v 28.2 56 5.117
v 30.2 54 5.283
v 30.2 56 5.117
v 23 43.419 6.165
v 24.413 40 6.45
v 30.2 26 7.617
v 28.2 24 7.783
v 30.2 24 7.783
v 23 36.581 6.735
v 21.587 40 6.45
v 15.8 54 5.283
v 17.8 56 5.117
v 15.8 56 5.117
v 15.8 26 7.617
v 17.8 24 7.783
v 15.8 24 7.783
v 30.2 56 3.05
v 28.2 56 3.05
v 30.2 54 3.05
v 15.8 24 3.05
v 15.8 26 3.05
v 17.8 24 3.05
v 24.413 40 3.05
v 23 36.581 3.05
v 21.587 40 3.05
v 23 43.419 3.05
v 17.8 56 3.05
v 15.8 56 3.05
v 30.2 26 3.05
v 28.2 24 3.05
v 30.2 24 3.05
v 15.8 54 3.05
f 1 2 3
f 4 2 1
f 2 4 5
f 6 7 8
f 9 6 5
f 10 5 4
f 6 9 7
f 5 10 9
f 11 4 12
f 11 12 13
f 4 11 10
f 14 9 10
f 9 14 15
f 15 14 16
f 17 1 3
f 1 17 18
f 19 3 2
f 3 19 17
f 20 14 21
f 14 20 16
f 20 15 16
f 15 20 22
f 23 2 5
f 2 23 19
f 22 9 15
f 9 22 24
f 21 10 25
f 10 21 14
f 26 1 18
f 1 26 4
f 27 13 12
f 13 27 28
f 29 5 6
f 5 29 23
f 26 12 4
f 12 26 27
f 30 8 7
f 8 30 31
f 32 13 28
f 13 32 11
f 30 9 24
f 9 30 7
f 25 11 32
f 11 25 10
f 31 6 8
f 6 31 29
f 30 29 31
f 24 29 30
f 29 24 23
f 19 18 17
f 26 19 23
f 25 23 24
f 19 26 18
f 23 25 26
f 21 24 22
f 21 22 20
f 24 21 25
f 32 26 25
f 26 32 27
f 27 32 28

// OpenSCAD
// Lance Kindle - an adapter between two plastic train tracks.
// a wider, taller, brown track & a shorter, slimmer blue one.
// tracks are in same position, luckily.
// tracks traced out from picture in inkscape in vector form
// tested sizing by laser cutting. Then had to convert to dxf
/* 
https://reprap.org/forum/read.php?313,627739,714349#msg-714349
1 - Draw object in Inkscape
2 - Move object to lower left corner of page, align left/right center marker to left page border, align top/bottom center marker with the bottom page border (it may help to turn off the page shadow in Document Properties)
2* - this can be done with shrinking document size to selected object
3 - Select Objects you want to export
4 - Convert to Path: Path --> Object to Path (Ctrl+Shift+C)
5 - Flatten Beziers: Extensions --> Modify Path --> Flatten Beziers (adjust the value based on granularity you need; I use 0.1 for most things)
6 - Save as Desktop Cutting Plotter (Autocad DXF R14) .DXF file
7 - Make sure the ROBO-Master spline option is unchecked, LWPOLYLINE option is checked. I keep the base units in mm to be consistent with OpenSCAD.
7* - BASE UNITS ARE IMPORTANT! Find an option that allows you to specify mm in the Save-as-dxf dialog
*/

h2 = 11.4;  // height of larger brown train track
w2 = 45.83;  // width of brown track
W = 46; // largest width
h1 = 7.9;  // height of blue train track
H = 17;  // maximum height
L = 73;  // length of overall track
s1 = 61;  // step-out from blue track before going up
s2 = 19;  // step-out from brown track before going down
dxf_tracks_file = "joined_train_tracks.dxf";

module main_track_block() {
linear_extrude(height = H, center = false)
    import(file = dxf_tracks_file);
}

// a rough-cut slope to subtract from the main track block
module block_slope() {
polyhedron(
    points=[
     [0,s2,h2],[w2,s2,h2],[w2,s1,h1],[0,s1,h1],// bottom layer
     [0,s2,H+1],[w2,s2,H+1],[w2,s1,H+1],[0,s1,H+1], // top layer
    ], // bottom slope face
    faces=[
     [0,1,2,3],  // bottom 
     [4,5,1,0],  // front
     [7,6,5,4],  // top
     [5,6,2,1],  // right
     [6,7,3,2],  // back
     [7,4,0,3],  // left
    ]
); // sloped part of polyhedron
// now we need to create two two flat cubes that take up the
// non-sloped areas
translate([0,0,h2])
    cube(size=[W,s2,H-h2+1]);
translate([0,s1,h1])
    cube(size=[W,L-s1,H-h1+1]);
}

tw=8.3;  // track width
//16.66 -- between tracks
//18.6- 1.65 -- 16.95
between_tracks = 18.4+tw;  // width between tracks
rail_height = 3.2; // measured as 3.2 on both blue/brown
tw1_start = 5.5; // track starts from side
tw1_end = tw1_start+tw;
tw2_start = tw1_start + between_tracks; // track 2 start width
tw2_end = tw2_start + tw;
th2 = 8.2; // h2 - rail_height; measured. Track height of brown side
th1= 4.9; // > as measured. h1 - rail_height; track height of blue side
// a rough-cut track w/ slope to cut from main track block
// (after block_slope has been cut away)
module track_slope() {
    //brown track intro
    translate([tw1_start,0,th2])
        cube(size=[tw,s2,rail_height+1]);
    translate([tw2_start,0,th2])
        cube(size=[tw,s2,rail_height+1]);
    // blue track intro
    translate([tw1_start,s1,th1])
        cube(size=[tw,L-s1,rail_height+1]);
    translate([tw2_start,s1,th1])
        cube(size=[tw,L-s1,rail_height+1]);
    // 2 sloped trapezoids from one track height to the next
    // left track
   polyhedron(
    points=[
     [tw1_start,s2,th2],[tw1_end,s2,th2],[tw1_end,s1,th1],[tw1_start,s1,th1],// bottom layer
     [tw1_start,s2,h2+1],[tw1_end,s2,h2+1],[tw1_end,s1,h1+1],[tw1_start,s1,h1+1], // top layer
    ], // bottom slope face
    faces=[
     [0,1,2,3],  // bottom 
     [4,5,1,0],  // front
     [7,6,5,4],  // top
     [5,6,2,1],  // right
     [6,7,3,2],  // back
     [7,4,0,3],  // left
    ]
   );
   // right track
   polyhedron(
    points=[
     [tw2_start,s2,th2],[tw2_end,s2,th2],[tw2_end,s1,th1],[tw2_start,s1,th1],// bottom layer
     [tw2_start,s2,h2+1],[tw2_end,s2,h2+1],[tw2_end,s1,h1+1],[tw2_start,s1,h1+1], // top layer
    ], // bottom slope face
    faces=[
     [0,1,2,3],  // bottom 
     [4,5,1,0],  // front
     [7,6,5,4],  // top
     [5,6,2,1],  // right
     [6,7,3,2],  // back
     [7,4,0,3],  // left
    ]
   );
}

// make small cuts into track to provide traction
module traction_strips() {
    slat_angle = -90*(th2 - th1)/(s1 - s2);
    slat_repeat = 0.8;
    slat_h = 0.3;
    slat_w = slat_repeat/2;
    // traction strips on slope
    for (s = [s2 + 0.5 : slat_repeat : s1 - 0.5]) {
        // s steps through length of track. For every %mm, we
        // cut in a small notch
        distance = s - s2; // starts at 0
        percent = distance/(s1-s2);
        height = th2 - (percent * (th2 - th1));
        //left-track
        translate([tw1_start + tw/2, s, height])
            rotate([slat_angle,0,0])
                cube(size=[tw, slat_w, slat_h*2], center=true);
        // right-track
        translate([tw2_start + tw/2, s, height])
            rotate([slat_angle,0,0])
                cube(size=[tw, slat_w, slat_h*2], center=true);
    }
    //traction strips wide track beginning
    for (s = [0 + slat_w: slat_repeat : s2 - slat_w]) {
        // left track start
        translate([tw1_start + tw/2, s, th2])
            cube(size=[tw, slat_w, slat_h*2], center=true);
        // right track start
        translate([tw2_start + tw/2, s, th2])
            cube(size=[tw, slat_w, slat_h*2], center=true);
    }
    //traction strips slim track end
    for (s = [s1 + slat_w: slat_repeat : L - slat_w]) {
        // left track start
        translate([tw1_start + tw/2, s, th1])
            cube(size=[tw, slat_w, slat_h*2], center=true);
        // right track start
        translate([tw2_start + tw/2, s, th1])
            cube(size=[tw, slat_w, slat_h*2], center=true);
    }
}

// cutout the middle portion to save time&filament
mx = 2; // margin from sides during cutout
my = 5; // margin from ends during cutout
module middle_cutout() {
    linear_extrude(height = H)
        polygon(
            points = [ 
                [tw1_end + mx, s2 + my],
                [tw1_end + mx, s1 - my],
                [tw2_start - mx, s1 - my],
                [tw2_start - mx, s2 + my], 
            ]
        );
}

// X braces same size and location as track_cutout()
wb = 2; // width of brace
module cutout_x() {
    // create a "line" from Lower-Left corner to Upper-Right corner of cutout in middle of track
    linear_extrude(height=H - rail_height)
        polygon(
            points = [
                // L-bracket around one corner
                [tw1_end + mx + wb, s2 + my], // LL corner
                [tw1_end + mx, s2 + my], // LL corner
                [tw1_end + mx, s2 + my + wb], // LL corner
                // L bracket around opposite corner
                [tw2_start - mx - wb, s1 - my], // UR corner
                [tw2_start - mx, s1 - my], // UR corner
                [tw2_start - mx, s1 - my - wb], // UR corner
            ]
        );
    // create a "line" from one Lower-Right corner to Upper-Left corner of cutout in middle of track
    linear_extrude(height=H - rail_height)
        polygon(
            points = [
                // L-bracket around one corner
                [tw2_start - mx - wb, s2 + my],  // LR corner
                [tw2_start - mx, s2 + my],  // LR corner
                [tw2_start - mx, s2 + my + wb],  // LR corner
                // L bracket around opposite corner
                [tw1_end + mx + wb, s1 - my], // UL corner
                [tw1_end + mx, s1 - my], // UL corner
                [tw1_end + mx, s1 - my - wb], // UL corner
            ]
        );
}

module hollow_train_tracks() {
    difference() {
        main_track_block();
        middle_cutout();  // cuts out giant middle piece
        block_slope(); // cuts slope into track shape
        track_slope(); // cuts in tracks (respecting slope)
        traction_strips(); // cuts in traction strips
    }
}

module braces_for_hollow() {
    translate([0,0,-rail_height]) { // sink down braces
        difference() {
            translate([0,0,rail_height]) // push up for subtraction
                cutout_x();  // add X-bracing in cutout
            block_slope();  // create slope in X-bracing
        }
    }
}

laser_cut_base_h = 3.05; // 1/8" acrylic height as measured
module laser_cutter_base() {  // models laser-cut base
    translate([0,0,-1])
        cube(size=[W,L,laser_cut_base_h + 1]);
}

difference() {
    union() {
        hollow_train_tracks();
        braces_for_hollow();
    }
    laser_cutter_base();  // subtraces expected laser-cut base from bottom of model. 3D print will place this "hovering" model on ground
}
